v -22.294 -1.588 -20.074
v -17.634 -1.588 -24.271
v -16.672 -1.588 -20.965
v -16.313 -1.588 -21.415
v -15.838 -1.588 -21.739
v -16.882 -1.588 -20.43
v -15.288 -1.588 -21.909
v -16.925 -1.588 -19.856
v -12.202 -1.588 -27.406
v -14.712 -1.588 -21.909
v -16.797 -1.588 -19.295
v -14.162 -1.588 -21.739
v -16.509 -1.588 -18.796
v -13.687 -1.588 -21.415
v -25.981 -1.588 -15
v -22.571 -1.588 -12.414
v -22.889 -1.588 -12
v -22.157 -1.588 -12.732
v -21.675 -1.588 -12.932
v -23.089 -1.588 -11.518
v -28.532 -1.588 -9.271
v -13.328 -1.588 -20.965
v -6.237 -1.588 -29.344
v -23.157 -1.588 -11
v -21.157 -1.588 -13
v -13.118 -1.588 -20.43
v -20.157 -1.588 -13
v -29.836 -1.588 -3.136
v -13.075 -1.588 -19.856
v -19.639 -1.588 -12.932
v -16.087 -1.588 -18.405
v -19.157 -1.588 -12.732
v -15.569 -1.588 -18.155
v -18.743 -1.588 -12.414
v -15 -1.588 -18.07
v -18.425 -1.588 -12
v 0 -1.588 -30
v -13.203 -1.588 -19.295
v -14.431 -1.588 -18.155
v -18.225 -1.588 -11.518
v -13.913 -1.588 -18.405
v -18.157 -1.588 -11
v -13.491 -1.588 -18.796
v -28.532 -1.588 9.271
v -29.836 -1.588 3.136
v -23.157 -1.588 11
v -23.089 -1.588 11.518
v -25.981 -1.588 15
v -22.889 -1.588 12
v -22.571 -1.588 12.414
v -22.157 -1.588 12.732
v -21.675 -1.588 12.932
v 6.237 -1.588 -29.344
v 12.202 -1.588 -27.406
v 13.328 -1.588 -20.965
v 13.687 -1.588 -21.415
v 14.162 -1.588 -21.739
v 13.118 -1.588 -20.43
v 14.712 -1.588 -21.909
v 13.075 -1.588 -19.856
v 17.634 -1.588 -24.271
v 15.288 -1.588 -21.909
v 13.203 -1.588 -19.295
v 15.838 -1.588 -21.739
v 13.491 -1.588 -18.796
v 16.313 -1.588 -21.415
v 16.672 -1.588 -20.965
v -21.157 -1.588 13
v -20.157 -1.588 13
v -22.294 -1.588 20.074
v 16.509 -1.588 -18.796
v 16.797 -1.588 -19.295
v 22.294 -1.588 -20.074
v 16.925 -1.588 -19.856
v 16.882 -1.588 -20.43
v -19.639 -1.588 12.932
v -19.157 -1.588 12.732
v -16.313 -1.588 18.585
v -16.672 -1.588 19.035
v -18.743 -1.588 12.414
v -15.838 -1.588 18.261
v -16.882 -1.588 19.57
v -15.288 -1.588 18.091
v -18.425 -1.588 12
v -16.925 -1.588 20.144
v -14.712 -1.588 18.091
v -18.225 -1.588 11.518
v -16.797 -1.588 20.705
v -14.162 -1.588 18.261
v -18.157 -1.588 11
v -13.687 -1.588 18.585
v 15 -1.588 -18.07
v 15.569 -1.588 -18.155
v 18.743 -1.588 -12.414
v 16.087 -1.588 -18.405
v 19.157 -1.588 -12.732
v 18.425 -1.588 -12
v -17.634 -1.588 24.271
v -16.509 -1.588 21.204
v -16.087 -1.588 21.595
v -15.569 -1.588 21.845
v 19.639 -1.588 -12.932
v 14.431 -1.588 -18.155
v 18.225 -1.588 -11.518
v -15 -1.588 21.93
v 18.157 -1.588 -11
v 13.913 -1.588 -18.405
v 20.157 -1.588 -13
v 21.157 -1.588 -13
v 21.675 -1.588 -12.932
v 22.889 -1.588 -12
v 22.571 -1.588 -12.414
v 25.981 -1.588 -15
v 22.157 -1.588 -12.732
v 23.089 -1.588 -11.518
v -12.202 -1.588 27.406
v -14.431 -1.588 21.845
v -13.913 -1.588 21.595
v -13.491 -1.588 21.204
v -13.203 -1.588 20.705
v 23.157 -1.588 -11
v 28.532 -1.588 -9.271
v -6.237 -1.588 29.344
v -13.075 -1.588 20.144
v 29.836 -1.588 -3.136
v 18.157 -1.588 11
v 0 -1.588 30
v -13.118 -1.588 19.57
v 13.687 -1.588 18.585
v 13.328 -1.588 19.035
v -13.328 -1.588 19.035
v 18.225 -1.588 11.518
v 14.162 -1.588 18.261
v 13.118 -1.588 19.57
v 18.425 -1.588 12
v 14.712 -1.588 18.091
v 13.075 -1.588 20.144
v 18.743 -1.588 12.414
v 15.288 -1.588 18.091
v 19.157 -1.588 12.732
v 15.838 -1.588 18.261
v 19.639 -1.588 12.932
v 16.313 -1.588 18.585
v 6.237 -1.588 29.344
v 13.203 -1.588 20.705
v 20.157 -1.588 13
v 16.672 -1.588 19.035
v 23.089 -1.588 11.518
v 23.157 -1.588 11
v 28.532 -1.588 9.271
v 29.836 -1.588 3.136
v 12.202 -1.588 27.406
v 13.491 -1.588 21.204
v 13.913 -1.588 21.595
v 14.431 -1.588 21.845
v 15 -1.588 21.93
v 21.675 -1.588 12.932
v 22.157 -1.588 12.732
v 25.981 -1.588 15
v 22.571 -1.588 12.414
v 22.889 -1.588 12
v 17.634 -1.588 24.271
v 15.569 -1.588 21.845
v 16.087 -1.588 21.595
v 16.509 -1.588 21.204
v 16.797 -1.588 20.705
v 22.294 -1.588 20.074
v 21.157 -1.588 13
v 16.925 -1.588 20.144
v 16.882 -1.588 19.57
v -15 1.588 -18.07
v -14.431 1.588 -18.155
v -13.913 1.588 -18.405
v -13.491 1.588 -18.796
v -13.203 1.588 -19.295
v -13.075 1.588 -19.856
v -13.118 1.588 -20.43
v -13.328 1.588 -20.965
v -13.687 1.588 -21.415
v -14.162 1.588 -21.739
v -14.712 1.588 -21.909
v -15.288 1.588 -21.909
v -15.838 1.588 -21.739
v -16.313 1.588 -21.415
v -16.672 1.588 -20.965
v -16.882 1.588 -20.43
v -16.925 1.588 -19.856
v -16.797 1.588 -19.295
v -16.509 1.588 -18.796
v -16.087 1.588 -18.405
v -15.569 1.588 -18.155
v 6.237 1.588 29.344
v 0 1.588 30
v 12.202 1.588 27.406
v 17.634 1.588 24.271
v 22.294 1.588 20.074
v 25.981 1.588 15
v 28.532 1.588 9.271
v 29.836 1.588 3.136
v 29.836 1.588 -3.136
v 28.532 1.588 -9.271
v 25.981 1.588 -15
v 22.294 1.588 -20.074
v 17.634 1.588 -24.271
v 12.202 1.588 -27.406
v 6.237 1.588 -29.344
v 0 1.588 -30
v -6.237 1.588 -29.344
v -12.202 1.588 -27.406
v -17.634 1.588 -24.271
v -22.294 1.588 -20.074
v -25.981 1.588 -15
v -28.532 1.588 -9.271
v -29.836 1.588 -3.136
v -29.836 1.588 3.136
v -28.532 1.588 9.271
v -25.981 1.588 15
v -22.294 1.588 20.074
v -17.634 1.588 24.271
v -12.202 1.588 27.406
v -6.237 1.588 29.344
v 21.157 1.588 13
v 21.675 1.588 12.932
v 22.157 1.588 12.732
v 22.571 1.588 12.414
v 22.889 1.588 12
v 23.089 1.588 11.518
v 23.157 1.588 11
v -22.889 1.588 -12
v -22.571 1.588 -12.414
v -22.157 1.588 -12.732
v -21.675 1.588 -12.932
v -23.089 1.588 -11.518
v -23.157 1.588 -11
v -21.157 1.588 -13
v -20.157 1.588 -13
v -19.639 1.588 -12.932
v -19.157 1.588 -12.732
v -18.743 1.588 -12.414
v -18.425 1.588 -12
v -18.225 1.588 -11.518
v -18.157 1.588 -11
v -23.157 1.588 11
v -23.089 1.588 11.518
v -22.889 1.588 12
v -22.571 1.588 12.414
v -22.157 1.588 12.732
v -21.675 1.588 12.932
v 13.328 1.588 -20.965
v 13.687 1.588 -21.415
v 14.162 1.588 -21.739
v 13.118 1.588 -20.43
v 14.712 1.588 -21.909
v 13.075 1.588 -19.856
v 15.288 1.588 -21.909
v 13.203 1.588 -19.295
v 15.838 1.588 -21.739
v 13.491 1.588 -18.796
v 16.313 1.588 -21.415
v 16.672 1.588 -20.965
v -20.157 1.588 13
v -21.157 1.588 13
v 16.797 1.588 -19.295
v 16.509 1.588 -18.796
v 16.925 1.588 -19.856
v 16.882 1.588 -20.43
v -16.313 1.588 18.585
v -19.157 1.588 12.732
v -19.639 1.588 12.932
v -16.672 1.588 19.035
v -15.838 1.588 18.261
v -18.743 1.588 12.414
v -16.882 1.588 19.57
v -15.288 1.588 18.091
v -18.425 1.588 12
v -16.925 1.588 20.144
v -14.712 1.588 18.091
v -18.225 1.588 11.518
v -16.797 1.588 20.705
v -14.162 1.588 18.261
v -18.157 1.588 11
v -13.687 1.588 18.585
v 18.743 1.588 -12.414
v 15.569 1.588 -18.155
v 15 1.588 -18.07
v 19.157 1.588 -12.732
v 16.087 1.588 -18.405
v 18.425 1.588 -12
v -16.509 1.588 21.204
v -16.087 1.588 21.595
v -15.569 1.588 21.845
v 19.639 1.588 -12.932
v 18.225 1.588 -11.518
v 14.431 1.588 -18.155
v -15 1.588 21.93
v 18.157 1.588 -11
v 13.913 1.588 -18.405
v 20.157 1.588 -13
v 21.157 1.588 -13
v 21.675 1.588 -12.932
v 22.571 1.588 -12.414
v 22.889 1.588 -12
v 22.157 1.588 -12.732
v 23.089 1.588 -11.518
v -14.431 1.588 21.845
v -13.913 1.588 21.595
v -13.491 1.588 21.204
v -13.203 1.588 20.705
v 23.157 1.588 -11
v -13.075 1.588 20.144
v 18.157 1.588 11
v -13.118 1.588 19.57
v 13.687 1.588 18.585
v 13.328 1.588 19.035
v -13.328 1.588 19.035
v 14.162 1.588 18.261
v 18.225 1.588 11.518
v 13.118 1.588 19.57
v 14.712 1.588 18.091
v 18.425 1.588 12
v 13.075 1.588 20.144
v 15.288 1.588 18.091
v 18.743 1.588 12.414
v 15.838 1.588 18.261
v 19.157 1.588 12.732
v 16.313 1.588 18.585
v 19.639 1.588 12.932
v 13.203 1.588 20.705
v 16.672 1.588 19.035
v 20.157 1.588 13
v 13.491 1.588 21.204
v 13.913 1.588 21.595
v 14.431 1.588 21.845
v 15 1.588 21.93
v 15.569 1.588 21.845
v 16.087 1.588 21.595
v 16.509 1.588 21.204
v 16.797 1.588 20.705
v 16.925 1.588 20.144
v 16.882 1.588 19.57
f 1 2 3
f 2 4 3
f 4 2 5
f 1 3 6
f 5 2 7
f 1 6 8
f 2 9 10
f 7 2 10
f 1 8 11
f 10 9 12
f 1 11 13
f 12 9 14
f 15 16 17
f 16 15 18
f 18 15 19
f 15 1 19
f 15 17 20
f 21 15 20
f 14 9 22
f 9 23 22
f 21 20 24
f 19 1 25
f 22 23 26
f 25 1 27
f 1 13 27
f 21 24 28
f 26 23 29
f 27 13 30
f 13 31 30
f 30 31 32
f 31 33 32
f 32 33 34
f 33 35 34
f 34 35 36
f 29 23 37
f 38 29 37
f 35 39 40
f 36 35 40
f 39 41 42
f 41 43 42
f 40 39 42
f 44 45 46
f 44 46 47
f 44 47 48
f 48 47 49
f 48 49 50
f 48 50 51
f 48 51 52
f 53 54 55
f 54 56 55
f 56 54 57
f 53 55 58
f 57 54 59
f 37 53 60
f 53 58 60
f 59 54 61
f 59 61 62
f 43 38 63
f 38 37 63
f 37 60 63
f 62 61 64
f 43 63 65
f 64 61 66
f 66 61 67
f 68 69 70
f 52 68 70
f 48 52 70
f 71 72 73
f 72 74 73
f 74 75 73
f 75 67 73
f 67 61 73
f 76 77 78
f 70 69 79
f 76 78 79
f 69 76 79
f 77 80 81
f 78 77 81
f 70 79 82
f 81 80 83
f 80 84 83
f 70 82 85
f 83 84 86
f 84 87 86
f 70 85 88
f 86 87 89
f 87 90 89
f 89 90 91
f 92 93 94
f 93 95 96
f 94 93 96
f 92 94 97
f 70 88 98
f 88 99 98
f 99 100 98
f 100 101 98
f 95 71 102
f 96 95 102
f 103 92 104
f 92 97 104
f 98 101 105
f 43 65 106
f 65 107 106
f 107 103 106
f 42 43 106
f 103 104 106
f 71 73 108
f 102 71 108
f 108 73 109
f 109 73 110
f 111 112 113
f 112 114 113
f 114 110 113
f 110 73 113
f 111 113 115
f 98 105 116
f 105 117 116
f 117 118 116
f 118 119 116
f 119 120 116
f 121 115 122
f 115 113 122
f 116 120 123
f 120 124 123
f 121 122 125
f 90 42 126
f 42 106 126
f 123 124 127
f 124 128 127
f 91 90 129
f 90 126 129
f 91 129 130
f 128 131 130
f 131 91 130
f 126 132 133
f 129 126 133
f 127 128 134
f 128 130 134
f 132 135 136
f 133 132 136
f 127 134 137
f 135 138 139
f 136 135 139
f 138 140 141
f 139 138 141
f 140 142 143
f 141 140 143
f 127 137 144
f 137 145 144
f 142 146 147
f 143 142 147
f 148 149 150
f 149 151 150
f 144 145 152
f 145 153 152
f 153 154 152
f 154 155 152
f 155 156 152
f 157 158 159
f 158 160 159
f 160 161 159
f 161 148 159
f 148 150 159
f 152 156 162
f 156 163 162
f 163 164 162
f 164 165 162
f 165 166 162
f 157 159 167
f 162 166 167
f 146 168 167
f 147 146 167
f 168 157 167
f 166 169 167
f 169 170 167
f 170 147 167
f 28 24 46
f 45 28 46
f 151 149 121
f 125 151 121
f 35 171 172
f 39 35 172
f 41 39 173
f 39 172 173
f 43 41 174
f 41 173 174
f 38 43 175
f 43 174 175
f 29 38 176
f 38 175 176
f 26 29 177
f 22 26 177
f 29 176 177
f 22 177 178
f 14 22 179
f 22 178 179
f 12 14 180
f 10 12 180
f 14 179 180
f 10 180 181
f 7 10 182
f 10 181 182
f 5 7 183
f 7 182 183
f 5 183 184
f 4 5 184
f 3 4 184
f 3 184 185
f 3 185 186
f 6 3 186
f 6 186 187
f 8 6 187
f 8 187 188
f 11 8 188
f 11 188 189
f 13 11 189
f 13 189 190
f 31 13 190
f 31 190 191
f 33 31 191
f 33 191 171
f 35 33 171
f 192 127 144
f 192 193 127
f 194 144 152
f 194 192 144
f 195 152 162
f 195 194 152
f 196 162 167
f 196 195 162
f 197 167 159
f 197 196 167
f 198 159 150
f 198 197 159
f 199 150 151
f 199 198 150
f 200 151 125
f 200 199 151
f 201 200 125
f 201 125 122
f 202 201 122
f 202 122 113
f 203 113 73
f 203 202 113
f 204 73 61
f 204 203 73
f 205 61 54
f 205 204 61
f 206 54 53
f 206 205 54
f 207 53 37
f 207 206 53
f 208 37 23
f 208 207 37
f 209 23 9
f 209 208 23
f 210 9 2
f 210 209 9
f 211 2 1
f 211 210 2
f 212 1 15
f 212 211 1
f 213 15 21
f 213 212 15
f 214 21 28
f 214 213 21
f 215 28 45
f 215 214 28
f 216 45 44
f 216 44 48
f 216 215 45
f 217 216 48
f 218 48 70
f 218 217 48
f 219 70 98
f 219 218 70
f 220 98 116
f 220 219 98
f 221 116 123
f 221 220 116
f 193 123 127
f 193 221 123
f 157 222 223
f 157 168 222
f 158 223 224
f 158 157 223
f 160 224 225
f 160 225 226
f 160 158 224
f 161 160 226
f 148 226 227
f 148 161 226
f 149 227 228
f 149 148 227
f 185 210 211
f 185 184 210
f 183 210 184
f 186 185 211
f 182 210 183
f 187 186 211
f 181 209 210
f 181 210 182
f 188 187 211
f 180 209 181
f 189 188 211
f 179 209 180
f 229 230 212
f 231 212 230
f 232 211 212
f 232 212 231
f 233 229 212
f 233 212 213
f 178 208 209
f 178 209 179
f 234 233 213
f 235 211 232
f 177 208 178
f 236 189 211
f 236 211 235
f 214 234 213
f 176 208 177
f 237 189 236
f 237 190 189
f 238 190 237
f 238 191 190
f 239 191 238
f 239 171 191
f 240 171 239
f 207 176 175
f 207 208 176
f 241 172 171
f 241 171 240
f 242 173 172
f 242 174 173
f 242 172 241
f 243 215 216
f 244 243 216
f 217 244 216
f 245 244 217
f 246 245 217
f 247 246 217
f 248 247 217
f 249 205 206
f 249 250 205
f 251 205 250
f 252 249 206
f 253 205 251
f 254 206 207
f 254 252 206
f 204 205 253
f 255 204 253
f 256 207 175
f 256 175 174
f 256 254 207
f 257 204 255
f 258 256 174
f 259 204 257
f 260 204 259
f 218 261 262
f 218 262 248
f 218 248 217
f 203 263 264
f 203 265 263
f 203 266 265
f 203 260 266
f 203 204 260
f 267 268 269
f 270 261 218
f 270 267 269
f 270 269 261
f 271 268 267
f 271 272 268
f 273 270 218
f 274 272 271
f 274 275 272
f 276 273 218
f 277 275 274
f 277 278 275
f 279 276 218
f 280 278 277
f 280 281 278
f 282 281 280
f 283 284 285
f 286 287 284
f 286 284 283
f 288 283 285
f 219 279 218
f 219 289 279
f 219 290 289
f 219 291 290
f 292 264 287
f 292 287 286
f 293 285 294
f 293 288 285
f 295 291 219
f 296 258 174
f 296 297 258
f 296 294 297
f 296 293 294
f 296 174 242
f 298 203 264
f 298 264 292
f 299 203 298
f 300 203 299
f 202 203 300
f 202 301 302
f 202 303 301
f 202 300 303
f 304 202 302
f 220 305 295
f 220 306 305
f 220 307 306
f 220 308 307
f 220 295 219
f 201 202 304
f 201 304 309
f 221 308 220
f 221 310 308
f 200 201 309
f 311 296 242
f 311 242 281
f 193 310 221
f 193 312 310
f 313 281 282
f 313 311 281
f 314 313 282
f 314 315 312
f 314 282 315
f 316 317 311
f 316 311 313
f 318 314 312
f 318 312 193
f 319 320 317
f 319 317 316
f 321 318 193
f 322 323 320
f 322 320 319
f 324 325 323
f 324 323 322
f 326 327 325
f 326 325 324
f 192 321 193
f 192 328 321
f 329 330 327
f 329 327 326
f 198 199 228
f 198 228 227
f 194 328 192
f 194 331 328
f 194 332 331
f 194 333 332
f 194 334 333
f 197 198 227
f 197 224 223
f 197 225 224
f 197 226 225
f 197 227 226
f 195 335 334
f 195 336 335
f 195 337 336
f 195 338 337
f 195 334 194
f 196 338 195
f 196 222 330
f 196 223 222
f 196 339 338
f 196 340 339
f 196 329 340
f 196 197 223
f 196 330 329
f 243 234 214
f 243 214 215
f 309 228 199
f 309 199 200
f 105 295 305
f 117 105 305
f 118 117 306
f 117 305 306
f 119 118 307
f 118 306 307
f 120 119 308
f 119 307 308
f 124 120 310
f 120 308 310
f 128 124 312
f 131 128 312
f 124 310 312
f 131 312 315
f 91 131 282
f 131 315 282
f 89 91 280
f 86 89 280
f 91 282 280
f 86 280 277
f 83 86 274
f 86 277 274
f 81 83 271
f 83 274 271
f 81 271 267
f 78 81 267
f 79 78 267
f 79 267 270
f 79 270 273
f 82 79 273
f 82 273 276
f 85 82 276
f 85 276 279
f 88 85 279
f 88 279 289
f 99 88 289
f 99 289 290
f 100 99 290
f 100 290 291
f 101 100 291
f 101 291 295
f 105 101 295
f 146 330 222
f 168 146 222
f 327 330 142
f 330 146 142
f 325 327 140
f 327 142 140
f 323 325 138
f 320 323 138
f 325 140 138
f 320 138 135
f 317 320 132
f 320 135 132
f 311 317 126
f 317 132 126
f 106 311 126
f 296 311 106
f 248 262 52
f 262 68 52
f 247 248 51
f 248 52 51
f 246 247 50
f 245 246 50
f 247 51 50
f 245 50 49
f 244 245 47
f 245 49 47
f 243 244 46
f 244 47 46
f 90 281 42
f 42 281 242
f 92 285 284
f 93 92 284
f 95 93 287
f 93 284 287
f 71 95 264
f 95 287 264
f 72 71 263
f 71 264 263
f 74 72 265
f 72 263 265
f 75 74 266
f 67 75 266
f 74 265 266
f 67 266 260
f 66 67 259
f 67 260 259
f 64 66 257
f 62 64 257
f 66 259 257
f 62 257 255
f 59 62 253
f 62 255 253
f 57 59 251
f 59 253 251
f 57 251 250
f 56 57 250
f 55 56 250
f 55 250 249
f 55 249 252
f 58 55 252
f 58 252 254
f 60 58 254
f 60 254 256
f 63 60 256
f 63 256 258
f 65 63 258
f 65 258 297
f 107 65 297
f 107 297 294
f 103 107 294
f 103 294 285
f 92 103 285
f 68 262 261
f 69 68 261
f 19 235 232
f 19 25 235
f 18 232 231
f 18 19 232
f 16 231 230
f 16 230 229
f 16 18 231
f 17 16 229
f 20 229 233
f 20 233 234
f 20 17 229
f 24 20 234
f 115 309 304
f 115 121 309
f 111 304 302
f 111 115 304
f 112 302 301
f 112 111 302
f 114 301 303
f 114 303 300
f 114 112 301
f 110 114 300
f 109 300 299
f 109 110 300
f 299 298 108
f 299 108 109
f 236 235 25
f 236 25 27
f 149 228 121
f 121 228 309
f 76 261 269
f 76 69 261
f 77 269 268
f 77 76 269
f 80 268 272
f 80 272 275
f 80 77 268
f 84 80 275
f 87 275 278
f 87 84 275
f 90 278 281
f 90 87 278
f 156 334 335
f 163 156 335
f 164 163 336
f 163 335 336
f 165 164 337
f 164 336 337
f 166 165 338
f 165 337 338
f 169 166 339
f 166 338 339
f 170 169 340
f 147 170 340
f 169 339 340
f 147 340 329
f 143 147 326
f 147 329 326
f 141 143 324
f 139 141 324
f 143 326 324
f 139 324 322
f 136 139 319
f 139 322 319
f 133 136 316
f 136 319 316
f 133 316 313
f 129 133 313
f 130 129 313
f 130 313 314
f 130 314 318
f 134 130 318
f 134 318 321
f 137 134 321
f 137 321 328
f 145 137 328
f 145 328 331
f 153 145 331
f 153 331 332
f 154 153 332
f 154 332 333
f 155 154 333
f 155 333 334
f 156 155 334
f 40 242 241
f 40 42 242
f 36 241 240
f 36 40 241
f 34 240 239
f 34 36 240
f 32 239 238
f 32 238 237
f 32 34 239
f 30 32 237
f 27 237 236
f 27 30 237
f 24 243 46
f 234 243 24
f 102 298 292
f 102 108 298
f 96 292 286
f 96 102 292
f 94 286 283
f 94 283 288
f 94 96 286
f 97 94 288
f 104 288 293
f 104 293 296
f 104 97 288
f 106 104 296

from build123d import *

# Parameters (mm, degrees)
SKETCH2_R          = 30
ACRYLICBASE_DEPTH  = 1.5875
SKETCH3_W          = 5
SKETCH3_H          = 26
WHEELS_DEPTH       = 43.545042308
RELIEFS_R          = 2
SKETCH4_R          = 1.9304
CUT_EXTRUDE1_DEPTH = 43.545042308


with BuildPart() as part:
    # Sketch2 → AcrylicBase (new, symmetric)
    with BuildSketch(Plane(origin=(0, 0, 0), x_dir=(1, 0, 0), z_dir=(0, 1, 0))):
        Circle(SKETCH2_R)
    extrude(amount=ACRYLICBASE_DEPTH, both=True)

    # Sketch3 → wheels (cut, through all)
    with BuildSketch(Plane(origin=(0, 1.5875, 0), x_dir=(1, 0, 0), z_dir=(0, 1, 0))):
        with Locations((-20.657104633, 0)):
            Rectangle(SKETCH3_W, SKETCH3_H)
        with Locations((20.657104633, 0)):
            Rectangle(SKETCH3_W, SKETCH3_H)
    extrude(amount=-WHEELS_DEPTH, mode=Mode.SUBTRACT)

    # reliefs
    reliefs_edges = [part.edges().sort_by_distance(p)[0] for p in [
        (18.157104633, 0, -13),
        (23.157104633, 0, -13),
        (23.157104633, 0, 13),
        (18.157104633, 0, 13),
        (-23.157104633, 0, 13),
        (-18.157104633, 0, 13),
        (-18.157104633, 0, -13),
        (-23.157104633, 0, -13),
    ]]
    fillet(reliefs_edges, radius=RELIEFS_R)

    # Sketch4 → Cut-Extrude1 (cut, through all)
    with BuildSketch(Plane(origin=(0, 1.5875, 0), x_dir=(1, 0, 0), z_dir=(0, 1, 0))):
        with Locations((-15, 20)):
            Circle(SKETCH4_R)
        with Locations((-15, -20)):
            Circle(SKETCH4_R)
        with Locations((15, -20)):
            Circle(SKETCH4_R)
        with Locations((15, 20)):
            Circle(SKETCH4_R)
    extrude(amount=-CUT_EXTRUDE1_DEPTH, mode=Mode.SUBTRACT)


solid = part.part
